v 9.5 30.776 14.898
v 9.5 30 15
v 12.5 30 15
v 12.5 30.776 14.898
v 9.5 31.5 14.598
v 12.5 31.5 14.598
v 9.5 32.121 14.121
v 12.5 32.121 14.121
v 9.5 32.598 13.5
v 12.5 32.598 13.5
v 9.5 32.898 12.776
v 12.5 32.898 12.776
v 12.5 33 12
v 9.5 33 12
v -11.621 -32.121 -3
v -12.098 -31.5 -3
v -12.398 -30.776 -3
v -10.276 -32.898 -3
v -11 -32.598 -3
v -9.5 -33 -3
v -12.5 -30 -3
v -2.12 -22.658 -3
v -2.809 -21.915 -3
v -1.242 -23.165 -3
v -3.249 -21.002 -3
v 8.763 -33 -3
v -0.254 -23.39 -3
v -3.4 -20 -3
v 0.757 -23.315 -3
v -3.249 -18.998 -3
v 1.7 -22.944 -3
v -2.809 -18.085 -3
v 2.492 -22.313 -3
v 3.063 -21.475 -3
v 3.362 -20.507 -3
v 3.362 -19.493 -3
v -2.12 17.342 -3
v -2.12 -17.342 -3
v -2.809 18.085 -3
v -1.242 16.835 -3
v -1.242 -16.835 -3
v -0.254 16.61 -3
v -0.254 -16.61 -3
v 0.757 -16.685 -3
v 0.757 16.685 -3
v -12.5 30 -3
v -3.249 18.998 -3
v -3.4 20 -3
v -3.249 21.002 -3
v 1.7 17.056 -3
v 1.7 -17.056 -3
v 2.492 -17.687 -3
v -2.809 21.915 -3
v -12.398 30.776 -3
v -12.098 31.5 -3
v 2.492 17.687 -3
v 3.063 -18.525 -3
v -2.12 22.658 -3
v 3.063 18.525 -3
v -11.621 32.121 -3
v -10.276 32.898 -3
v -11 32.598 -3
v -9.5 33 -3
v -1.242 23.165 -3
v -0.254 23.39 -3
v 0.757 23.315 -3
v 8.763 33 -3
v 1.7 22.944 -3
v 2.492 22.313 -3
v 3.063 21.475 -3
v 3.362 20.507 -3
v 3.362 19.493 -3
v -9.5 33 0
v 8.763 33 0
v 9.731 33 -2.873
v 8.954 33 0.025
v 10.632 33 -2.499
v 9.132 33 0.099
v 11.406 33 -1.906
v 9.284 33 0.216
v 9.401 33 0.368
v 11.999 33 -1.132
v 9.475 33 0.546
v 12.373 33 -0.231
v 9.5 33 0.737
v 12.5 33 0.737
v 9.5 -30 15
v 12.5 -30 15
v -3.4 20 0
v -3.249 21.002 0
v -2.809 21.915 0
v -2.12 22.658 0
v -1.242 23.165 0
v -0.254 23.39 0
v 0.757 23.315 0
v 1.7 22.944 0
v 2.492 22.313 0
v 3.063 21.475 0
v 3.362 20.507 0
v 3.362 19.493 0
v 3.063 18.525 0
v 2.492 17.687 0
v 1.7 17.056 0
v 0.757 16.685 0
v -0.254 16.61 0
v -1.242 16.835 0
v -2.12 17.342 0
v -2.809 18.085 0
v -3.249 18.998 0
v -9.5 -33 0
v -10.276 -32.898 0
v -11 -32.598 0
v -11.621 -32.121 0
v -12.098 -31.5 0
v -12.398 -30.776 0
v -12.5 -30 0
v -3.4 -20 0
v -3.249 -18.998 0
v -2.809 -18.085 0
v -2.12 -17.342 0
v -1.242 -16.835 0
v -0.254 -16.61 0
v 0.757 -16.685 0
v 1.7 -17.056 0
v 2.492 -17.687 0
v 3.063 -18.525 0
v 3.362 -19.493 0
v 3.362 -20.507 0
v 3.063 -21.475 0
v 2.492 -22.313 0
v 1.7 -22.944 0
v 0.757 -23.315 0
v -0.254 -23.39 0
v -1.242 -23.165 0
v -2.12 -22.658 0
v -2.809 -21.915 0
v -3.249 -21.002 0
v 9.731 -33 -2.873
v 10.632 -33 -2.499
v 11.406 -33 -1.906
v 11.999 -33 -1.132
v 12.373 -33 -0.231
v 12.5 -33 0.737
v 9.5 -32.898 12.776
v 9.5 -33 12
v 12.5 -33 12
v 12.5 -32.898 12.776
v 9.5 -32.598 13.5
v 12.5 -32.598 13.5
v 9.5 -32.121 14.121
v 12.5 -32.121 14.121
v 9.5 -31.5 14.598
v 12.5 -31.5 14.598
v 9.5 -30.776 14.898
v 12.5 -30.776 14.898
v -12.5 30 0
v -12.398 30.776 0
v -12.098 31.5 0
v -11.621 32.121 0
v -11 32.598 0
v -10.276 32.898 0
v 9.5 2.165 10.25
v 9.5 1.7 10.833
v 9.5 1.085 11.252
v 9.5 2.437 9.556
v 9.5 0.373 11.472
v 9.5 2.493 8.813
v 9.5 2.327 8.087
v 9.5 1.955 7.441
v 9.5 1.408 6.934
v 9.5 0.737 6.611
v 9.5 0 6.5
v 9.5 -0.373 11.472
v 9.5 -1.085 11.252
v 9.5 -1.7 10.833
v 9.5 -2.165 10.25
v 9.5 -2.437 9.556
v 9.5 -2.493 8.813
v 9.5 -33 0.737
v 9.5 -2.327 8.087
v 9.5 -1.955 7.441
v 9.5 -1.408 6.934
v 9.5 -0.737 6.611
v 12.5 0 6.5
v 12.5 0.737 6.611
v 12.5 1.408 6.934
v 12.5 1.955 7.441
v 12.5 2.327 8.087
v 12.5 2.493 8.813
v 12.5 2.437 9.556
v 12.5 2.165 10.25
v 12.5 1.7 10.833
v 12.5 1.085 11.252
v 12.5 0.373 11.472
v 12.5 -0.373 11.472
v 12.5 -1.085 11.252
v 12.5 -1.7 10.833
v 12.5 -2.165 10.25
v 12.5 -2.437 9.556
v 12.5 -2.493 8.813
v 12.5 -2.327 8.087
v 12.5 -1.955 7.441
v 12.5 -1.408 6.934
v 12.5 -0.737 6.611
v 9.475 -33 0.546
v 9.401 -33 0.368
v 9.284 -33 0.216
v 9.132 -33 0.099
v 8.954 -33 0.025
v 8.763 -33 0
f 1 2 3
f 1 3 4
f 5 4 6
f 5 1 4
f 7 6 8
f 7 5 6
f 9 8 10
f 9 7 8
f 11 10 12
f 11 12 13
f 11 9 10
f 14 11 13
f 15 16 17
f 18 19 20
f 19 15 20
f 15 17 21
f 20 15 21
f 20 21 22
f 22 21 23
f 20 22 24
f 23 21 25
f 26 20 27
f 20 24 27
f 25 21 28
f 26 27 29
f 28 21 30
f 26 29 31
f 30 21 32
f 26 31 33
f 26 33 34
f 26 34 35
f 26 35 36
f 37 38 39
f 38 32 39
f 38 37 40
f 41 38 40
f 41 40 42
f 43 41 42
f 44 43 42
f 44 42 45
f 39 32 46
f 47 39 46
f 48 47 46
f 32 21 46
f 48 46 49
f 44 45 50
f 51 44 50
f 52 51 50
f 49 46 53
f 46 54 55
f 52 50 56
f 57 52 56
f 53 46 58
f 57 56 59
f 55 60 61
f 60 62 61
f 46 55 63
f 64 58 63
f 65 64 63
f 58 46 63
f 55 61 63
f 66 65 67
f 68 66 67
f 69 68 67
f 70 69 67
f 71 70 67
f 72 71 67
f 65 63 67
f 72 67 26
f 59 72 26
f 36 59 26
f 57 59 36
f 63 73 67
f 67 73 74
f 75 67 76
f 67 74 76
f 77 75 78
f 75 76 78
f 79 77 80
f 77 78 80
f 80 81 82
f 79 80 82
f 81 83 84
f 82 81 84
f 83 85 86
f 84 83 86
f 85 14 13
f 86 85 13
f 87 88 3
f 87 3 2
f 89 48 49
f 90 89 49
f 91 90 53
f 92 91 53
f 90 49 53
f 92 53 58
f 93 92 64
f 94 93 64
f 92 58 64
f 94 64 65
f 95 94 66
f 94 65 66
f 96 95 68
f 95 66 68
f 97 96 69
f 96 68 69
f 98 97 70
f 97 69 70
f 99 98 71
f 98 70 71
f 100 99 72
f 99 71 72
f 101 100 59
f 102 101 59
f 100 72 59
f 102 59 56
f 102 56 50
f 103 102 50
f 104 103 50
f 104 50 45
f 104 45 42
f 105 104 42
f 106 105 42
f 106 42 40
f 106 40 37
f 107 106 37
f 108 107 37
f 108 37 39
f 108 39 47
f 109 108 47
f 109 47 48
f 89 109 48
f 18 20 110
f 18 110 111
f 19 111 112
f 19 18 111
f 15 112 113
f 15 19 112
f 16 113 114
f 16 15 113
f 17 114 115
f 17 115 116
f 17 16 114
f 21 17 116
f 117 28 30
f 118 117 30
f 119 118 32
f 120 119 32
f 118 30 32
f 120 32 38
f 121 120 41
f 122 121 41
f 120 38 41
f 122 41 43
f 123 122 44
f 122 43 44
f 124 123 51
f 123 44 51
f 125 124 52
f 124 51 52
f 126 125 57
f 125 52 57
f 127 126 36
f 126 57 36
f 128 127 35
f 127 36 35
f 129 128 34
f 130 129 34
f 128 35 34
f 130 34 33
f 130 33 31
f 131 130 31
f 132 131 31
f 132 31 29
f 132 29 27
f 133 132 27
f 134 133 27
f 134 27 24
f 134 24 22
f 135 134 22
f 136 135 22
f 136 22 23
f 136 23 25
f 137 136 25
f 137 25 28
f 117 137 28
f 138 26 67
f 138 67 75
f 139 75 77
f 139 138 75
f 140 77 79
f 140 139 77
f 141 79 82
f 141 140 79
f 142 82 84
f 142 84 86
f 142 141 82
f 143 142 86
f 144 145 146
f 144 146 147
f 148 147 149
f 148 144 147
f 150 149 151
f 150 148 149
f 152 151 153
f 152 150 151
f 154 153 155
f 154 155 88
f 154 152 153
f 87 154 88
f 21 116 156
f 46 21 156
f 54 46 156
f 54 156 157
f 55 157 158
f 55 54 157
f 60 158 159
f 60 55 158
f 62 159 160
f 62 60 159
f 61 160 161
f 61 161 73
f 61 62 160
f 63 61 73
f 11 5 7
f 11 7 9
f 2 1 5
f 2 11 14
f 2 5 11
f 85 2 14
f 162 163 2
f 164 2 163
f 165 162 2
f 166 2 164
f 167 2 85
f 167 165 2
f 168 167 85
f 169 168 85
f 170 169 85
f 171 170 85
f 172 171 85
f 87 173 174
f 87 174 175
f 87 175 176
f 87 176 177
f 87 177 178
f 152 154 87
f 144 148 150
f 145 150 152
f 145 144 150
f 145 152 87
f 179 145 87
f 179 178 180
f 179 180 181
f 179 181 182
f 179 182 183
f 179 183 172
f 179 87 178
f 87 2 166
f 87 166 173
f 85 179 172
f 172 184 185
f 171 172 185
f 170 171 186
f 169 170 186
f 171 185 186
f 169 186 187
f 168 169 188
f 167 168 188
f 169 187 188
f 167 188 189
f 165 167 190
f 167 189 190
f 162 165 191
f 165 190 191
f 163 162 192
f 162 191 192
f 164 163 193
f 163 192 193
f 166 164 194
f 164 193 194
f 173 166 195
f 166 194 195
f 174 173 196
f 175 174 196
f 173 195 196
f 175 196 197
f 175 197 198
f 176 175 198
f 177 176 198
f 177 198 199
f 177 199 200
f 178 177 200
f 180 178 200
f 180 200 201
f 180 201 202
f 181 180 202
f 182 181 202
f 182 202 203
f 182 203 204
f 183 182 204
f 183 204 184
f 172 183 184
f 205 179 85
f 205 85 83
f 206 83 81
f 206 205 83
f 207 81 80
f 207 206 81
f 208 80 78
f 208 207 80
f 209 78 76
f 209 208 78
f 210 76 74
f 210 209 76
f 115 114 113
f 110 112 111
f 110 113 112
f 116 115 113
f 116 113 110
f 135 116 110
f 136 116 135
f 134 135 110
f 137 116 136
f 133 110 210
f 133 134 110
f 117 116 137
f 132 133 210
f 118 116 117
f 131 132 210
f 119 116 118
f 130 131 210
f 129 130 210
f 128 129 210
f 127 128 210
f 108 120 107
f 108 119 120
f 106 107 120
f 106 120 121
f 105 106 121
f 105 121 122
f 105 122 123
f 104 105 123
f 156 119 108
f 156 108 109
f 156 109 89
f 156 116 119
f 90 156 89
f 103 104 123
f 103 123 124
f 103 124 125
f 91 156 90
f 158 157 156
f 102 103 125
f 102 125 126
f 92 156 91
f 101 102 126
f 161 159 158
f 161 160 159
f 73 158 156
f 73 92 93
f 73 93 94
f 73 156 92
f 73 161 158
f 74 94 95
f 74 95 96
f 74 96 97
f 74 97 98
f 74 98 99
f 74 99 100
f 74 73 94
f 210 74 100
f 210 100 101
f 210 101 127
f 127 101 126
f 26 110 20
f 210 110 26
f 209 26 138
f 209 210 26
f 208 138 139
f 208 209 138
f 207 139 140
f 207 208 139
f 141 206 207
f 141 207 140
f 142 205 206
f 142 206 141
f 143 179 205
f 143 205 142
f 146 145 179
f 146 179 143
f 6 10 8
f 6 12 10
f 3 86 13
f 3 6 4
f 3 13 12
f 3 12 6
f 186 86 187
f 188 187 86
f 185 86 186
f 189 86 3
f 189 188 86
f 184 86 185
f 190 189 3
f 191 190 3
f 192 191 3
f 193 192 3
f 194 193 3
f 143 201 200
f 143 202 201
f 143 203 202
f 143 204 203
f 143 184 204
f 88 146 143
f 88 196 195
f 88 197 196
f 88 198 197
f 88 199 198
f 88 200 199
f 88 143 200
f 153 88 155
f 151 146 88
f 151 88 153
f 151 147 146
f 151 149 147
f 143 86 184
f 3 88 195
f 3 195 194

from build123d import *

# Parameters (mm, degrees)
SKETCH_1_W                       = 25
SKETCH_1_H                       = 66
SM_BASE_FLANGE_1_DEPTH           = 3
SM_EDGE_FLANGE_1_STRIP_W         = 13.4732
SM_EDGE_FLANGE_1_STRIP_H         = 3
SM_EDGE_FLANGE_1_STRIP_CUT_DEPTH = 66
SM_EDGE_FLANGE_1_DEPTH           = 66
HOLE_WIZARD_M8_1_D               = 6.8
HOLE_WIZARD_M6_2_D               = 5
OTHER_START                      = 9.5
OTHER_1_DEPTH                    = 3
OTHER_START_2                    = -3
OTHER_1_2_DEPTH                  = 3


# Read off the part's stored shape, not the designer's step: 断开-边角1
# Sheet-metal steps are written as plain solids
with BuildPart() as part:
    # Sketch 1 → 基体-法兰1 (new body)
    with BuildSketch(Plane.XY):
        Rectangle(SKETCH_1_W, SKETCH_1_H)
    extrude(amount=-SM_BASE_FLANGE_1_DEPTH)

    # 边线-法兰1 strip (across the edge) → 边线-法兰1 strip cut (cut)
    with BuildSketch(Plane(origin=(12.5, -33, 0), x_dir=(-1, 0, 0), z_dir=(0, 1, 0))):
        with Locations((-3, -1.5)):
            Rectangle(SM_EDGE_FLANGE_1_STRIP_W, SM_EDGE_FLANGE_1_STRIP_H)
    extrude(amount=SM_EDGE_FLANGE_1_STRIP_CUT_DEPTH, mode=Mode.SUBTRACT)

    # 边线-法兰1 section (across the edge) → 边线-法兰1 (add)
    with BuildSketch(Plane(origin=(12.5, -33, 0), x_dir=(-1, 0, 0), z_dir=(0, 1, 0))):
        with BuildLine():
            Line((0, 0.7366), (0, 15))
            Line((0, 15), (3, 15))
            Line((3, 15), (3, 0.7366))
            ThreePointArc((3, 0.7366), (3.215745145, 0.215745145), (3.7366, 0))
            Line((3.7366, 0), (3.7366, -3))
            ThreePointArc((3.7366, -3), (1.094424801, -1.905575199), (0, 0.7366))
        make_face()
    extrude(amount=SM_EDGE_FLANGE_1_DEPTH)

    # M8 螺纹孔1 (through all)
    with Locations(Plane.XY):
        with Locations((0, -20), (0, 20)):
            Hole(HOLE_WIZARD_M8_1_D / 2)

    # M6 螺纹孔2 (through all)
    with Locations(Plane.ZY.offset(-9.5)):
        with Locations((9, 0)):
            Hole(HOLE_WIZARD_M6_2_D / 2)

    # Other 1 outline → Other 1 (cut)
    with BuildSketch(Plane.YZ.offset(OTHER_START)):
        with BuildLine():
            Line((-33, 15), (-33, 12))
            ThreePointArc((-33, 12), (-32.121320344, 14.121320344), (-30, 15))
            Line((-30, 15), (-33, 15))
        make_face()
        with BuildLine():
            Line((33, 15), (30, 15))
            ThreePointArc((30, 15), (32.121320344, 14.121320344), (33, 12))
            Line((33, 12), (33, 15))
        make_face()
    extrude(amount=OTHER_1_DEPTH, mode=Mode.SUBTRACT)

    # Other 1 2 outline → Other 1 2 (cut)
    with BuildSketch(Plane.XY.offset(OTHER_START_2)):
        with BuildLine():
            Line((-12.5, 33), (-12.5, 30))
            ThreePointArc((-12.5, 30), (-11.621320344, 32.121320344), (-9.5, 33))
            Line((-9.5, 33), (-12.5, 33))
        make_face()
        with BuildLine():
            ThreePointArc((-9.5, -33), (-11.621320344, -32.121320344), (-12.5, -30))
            Line((-12.5, -30), (-12.5, -33))
            Line((-12.5, -33), (-9.5, -33))
        make_face()
    extrude(amount=OTHER_1_2_DEPTH, mode=Mode.SUBTRACT)


solid = part.part
